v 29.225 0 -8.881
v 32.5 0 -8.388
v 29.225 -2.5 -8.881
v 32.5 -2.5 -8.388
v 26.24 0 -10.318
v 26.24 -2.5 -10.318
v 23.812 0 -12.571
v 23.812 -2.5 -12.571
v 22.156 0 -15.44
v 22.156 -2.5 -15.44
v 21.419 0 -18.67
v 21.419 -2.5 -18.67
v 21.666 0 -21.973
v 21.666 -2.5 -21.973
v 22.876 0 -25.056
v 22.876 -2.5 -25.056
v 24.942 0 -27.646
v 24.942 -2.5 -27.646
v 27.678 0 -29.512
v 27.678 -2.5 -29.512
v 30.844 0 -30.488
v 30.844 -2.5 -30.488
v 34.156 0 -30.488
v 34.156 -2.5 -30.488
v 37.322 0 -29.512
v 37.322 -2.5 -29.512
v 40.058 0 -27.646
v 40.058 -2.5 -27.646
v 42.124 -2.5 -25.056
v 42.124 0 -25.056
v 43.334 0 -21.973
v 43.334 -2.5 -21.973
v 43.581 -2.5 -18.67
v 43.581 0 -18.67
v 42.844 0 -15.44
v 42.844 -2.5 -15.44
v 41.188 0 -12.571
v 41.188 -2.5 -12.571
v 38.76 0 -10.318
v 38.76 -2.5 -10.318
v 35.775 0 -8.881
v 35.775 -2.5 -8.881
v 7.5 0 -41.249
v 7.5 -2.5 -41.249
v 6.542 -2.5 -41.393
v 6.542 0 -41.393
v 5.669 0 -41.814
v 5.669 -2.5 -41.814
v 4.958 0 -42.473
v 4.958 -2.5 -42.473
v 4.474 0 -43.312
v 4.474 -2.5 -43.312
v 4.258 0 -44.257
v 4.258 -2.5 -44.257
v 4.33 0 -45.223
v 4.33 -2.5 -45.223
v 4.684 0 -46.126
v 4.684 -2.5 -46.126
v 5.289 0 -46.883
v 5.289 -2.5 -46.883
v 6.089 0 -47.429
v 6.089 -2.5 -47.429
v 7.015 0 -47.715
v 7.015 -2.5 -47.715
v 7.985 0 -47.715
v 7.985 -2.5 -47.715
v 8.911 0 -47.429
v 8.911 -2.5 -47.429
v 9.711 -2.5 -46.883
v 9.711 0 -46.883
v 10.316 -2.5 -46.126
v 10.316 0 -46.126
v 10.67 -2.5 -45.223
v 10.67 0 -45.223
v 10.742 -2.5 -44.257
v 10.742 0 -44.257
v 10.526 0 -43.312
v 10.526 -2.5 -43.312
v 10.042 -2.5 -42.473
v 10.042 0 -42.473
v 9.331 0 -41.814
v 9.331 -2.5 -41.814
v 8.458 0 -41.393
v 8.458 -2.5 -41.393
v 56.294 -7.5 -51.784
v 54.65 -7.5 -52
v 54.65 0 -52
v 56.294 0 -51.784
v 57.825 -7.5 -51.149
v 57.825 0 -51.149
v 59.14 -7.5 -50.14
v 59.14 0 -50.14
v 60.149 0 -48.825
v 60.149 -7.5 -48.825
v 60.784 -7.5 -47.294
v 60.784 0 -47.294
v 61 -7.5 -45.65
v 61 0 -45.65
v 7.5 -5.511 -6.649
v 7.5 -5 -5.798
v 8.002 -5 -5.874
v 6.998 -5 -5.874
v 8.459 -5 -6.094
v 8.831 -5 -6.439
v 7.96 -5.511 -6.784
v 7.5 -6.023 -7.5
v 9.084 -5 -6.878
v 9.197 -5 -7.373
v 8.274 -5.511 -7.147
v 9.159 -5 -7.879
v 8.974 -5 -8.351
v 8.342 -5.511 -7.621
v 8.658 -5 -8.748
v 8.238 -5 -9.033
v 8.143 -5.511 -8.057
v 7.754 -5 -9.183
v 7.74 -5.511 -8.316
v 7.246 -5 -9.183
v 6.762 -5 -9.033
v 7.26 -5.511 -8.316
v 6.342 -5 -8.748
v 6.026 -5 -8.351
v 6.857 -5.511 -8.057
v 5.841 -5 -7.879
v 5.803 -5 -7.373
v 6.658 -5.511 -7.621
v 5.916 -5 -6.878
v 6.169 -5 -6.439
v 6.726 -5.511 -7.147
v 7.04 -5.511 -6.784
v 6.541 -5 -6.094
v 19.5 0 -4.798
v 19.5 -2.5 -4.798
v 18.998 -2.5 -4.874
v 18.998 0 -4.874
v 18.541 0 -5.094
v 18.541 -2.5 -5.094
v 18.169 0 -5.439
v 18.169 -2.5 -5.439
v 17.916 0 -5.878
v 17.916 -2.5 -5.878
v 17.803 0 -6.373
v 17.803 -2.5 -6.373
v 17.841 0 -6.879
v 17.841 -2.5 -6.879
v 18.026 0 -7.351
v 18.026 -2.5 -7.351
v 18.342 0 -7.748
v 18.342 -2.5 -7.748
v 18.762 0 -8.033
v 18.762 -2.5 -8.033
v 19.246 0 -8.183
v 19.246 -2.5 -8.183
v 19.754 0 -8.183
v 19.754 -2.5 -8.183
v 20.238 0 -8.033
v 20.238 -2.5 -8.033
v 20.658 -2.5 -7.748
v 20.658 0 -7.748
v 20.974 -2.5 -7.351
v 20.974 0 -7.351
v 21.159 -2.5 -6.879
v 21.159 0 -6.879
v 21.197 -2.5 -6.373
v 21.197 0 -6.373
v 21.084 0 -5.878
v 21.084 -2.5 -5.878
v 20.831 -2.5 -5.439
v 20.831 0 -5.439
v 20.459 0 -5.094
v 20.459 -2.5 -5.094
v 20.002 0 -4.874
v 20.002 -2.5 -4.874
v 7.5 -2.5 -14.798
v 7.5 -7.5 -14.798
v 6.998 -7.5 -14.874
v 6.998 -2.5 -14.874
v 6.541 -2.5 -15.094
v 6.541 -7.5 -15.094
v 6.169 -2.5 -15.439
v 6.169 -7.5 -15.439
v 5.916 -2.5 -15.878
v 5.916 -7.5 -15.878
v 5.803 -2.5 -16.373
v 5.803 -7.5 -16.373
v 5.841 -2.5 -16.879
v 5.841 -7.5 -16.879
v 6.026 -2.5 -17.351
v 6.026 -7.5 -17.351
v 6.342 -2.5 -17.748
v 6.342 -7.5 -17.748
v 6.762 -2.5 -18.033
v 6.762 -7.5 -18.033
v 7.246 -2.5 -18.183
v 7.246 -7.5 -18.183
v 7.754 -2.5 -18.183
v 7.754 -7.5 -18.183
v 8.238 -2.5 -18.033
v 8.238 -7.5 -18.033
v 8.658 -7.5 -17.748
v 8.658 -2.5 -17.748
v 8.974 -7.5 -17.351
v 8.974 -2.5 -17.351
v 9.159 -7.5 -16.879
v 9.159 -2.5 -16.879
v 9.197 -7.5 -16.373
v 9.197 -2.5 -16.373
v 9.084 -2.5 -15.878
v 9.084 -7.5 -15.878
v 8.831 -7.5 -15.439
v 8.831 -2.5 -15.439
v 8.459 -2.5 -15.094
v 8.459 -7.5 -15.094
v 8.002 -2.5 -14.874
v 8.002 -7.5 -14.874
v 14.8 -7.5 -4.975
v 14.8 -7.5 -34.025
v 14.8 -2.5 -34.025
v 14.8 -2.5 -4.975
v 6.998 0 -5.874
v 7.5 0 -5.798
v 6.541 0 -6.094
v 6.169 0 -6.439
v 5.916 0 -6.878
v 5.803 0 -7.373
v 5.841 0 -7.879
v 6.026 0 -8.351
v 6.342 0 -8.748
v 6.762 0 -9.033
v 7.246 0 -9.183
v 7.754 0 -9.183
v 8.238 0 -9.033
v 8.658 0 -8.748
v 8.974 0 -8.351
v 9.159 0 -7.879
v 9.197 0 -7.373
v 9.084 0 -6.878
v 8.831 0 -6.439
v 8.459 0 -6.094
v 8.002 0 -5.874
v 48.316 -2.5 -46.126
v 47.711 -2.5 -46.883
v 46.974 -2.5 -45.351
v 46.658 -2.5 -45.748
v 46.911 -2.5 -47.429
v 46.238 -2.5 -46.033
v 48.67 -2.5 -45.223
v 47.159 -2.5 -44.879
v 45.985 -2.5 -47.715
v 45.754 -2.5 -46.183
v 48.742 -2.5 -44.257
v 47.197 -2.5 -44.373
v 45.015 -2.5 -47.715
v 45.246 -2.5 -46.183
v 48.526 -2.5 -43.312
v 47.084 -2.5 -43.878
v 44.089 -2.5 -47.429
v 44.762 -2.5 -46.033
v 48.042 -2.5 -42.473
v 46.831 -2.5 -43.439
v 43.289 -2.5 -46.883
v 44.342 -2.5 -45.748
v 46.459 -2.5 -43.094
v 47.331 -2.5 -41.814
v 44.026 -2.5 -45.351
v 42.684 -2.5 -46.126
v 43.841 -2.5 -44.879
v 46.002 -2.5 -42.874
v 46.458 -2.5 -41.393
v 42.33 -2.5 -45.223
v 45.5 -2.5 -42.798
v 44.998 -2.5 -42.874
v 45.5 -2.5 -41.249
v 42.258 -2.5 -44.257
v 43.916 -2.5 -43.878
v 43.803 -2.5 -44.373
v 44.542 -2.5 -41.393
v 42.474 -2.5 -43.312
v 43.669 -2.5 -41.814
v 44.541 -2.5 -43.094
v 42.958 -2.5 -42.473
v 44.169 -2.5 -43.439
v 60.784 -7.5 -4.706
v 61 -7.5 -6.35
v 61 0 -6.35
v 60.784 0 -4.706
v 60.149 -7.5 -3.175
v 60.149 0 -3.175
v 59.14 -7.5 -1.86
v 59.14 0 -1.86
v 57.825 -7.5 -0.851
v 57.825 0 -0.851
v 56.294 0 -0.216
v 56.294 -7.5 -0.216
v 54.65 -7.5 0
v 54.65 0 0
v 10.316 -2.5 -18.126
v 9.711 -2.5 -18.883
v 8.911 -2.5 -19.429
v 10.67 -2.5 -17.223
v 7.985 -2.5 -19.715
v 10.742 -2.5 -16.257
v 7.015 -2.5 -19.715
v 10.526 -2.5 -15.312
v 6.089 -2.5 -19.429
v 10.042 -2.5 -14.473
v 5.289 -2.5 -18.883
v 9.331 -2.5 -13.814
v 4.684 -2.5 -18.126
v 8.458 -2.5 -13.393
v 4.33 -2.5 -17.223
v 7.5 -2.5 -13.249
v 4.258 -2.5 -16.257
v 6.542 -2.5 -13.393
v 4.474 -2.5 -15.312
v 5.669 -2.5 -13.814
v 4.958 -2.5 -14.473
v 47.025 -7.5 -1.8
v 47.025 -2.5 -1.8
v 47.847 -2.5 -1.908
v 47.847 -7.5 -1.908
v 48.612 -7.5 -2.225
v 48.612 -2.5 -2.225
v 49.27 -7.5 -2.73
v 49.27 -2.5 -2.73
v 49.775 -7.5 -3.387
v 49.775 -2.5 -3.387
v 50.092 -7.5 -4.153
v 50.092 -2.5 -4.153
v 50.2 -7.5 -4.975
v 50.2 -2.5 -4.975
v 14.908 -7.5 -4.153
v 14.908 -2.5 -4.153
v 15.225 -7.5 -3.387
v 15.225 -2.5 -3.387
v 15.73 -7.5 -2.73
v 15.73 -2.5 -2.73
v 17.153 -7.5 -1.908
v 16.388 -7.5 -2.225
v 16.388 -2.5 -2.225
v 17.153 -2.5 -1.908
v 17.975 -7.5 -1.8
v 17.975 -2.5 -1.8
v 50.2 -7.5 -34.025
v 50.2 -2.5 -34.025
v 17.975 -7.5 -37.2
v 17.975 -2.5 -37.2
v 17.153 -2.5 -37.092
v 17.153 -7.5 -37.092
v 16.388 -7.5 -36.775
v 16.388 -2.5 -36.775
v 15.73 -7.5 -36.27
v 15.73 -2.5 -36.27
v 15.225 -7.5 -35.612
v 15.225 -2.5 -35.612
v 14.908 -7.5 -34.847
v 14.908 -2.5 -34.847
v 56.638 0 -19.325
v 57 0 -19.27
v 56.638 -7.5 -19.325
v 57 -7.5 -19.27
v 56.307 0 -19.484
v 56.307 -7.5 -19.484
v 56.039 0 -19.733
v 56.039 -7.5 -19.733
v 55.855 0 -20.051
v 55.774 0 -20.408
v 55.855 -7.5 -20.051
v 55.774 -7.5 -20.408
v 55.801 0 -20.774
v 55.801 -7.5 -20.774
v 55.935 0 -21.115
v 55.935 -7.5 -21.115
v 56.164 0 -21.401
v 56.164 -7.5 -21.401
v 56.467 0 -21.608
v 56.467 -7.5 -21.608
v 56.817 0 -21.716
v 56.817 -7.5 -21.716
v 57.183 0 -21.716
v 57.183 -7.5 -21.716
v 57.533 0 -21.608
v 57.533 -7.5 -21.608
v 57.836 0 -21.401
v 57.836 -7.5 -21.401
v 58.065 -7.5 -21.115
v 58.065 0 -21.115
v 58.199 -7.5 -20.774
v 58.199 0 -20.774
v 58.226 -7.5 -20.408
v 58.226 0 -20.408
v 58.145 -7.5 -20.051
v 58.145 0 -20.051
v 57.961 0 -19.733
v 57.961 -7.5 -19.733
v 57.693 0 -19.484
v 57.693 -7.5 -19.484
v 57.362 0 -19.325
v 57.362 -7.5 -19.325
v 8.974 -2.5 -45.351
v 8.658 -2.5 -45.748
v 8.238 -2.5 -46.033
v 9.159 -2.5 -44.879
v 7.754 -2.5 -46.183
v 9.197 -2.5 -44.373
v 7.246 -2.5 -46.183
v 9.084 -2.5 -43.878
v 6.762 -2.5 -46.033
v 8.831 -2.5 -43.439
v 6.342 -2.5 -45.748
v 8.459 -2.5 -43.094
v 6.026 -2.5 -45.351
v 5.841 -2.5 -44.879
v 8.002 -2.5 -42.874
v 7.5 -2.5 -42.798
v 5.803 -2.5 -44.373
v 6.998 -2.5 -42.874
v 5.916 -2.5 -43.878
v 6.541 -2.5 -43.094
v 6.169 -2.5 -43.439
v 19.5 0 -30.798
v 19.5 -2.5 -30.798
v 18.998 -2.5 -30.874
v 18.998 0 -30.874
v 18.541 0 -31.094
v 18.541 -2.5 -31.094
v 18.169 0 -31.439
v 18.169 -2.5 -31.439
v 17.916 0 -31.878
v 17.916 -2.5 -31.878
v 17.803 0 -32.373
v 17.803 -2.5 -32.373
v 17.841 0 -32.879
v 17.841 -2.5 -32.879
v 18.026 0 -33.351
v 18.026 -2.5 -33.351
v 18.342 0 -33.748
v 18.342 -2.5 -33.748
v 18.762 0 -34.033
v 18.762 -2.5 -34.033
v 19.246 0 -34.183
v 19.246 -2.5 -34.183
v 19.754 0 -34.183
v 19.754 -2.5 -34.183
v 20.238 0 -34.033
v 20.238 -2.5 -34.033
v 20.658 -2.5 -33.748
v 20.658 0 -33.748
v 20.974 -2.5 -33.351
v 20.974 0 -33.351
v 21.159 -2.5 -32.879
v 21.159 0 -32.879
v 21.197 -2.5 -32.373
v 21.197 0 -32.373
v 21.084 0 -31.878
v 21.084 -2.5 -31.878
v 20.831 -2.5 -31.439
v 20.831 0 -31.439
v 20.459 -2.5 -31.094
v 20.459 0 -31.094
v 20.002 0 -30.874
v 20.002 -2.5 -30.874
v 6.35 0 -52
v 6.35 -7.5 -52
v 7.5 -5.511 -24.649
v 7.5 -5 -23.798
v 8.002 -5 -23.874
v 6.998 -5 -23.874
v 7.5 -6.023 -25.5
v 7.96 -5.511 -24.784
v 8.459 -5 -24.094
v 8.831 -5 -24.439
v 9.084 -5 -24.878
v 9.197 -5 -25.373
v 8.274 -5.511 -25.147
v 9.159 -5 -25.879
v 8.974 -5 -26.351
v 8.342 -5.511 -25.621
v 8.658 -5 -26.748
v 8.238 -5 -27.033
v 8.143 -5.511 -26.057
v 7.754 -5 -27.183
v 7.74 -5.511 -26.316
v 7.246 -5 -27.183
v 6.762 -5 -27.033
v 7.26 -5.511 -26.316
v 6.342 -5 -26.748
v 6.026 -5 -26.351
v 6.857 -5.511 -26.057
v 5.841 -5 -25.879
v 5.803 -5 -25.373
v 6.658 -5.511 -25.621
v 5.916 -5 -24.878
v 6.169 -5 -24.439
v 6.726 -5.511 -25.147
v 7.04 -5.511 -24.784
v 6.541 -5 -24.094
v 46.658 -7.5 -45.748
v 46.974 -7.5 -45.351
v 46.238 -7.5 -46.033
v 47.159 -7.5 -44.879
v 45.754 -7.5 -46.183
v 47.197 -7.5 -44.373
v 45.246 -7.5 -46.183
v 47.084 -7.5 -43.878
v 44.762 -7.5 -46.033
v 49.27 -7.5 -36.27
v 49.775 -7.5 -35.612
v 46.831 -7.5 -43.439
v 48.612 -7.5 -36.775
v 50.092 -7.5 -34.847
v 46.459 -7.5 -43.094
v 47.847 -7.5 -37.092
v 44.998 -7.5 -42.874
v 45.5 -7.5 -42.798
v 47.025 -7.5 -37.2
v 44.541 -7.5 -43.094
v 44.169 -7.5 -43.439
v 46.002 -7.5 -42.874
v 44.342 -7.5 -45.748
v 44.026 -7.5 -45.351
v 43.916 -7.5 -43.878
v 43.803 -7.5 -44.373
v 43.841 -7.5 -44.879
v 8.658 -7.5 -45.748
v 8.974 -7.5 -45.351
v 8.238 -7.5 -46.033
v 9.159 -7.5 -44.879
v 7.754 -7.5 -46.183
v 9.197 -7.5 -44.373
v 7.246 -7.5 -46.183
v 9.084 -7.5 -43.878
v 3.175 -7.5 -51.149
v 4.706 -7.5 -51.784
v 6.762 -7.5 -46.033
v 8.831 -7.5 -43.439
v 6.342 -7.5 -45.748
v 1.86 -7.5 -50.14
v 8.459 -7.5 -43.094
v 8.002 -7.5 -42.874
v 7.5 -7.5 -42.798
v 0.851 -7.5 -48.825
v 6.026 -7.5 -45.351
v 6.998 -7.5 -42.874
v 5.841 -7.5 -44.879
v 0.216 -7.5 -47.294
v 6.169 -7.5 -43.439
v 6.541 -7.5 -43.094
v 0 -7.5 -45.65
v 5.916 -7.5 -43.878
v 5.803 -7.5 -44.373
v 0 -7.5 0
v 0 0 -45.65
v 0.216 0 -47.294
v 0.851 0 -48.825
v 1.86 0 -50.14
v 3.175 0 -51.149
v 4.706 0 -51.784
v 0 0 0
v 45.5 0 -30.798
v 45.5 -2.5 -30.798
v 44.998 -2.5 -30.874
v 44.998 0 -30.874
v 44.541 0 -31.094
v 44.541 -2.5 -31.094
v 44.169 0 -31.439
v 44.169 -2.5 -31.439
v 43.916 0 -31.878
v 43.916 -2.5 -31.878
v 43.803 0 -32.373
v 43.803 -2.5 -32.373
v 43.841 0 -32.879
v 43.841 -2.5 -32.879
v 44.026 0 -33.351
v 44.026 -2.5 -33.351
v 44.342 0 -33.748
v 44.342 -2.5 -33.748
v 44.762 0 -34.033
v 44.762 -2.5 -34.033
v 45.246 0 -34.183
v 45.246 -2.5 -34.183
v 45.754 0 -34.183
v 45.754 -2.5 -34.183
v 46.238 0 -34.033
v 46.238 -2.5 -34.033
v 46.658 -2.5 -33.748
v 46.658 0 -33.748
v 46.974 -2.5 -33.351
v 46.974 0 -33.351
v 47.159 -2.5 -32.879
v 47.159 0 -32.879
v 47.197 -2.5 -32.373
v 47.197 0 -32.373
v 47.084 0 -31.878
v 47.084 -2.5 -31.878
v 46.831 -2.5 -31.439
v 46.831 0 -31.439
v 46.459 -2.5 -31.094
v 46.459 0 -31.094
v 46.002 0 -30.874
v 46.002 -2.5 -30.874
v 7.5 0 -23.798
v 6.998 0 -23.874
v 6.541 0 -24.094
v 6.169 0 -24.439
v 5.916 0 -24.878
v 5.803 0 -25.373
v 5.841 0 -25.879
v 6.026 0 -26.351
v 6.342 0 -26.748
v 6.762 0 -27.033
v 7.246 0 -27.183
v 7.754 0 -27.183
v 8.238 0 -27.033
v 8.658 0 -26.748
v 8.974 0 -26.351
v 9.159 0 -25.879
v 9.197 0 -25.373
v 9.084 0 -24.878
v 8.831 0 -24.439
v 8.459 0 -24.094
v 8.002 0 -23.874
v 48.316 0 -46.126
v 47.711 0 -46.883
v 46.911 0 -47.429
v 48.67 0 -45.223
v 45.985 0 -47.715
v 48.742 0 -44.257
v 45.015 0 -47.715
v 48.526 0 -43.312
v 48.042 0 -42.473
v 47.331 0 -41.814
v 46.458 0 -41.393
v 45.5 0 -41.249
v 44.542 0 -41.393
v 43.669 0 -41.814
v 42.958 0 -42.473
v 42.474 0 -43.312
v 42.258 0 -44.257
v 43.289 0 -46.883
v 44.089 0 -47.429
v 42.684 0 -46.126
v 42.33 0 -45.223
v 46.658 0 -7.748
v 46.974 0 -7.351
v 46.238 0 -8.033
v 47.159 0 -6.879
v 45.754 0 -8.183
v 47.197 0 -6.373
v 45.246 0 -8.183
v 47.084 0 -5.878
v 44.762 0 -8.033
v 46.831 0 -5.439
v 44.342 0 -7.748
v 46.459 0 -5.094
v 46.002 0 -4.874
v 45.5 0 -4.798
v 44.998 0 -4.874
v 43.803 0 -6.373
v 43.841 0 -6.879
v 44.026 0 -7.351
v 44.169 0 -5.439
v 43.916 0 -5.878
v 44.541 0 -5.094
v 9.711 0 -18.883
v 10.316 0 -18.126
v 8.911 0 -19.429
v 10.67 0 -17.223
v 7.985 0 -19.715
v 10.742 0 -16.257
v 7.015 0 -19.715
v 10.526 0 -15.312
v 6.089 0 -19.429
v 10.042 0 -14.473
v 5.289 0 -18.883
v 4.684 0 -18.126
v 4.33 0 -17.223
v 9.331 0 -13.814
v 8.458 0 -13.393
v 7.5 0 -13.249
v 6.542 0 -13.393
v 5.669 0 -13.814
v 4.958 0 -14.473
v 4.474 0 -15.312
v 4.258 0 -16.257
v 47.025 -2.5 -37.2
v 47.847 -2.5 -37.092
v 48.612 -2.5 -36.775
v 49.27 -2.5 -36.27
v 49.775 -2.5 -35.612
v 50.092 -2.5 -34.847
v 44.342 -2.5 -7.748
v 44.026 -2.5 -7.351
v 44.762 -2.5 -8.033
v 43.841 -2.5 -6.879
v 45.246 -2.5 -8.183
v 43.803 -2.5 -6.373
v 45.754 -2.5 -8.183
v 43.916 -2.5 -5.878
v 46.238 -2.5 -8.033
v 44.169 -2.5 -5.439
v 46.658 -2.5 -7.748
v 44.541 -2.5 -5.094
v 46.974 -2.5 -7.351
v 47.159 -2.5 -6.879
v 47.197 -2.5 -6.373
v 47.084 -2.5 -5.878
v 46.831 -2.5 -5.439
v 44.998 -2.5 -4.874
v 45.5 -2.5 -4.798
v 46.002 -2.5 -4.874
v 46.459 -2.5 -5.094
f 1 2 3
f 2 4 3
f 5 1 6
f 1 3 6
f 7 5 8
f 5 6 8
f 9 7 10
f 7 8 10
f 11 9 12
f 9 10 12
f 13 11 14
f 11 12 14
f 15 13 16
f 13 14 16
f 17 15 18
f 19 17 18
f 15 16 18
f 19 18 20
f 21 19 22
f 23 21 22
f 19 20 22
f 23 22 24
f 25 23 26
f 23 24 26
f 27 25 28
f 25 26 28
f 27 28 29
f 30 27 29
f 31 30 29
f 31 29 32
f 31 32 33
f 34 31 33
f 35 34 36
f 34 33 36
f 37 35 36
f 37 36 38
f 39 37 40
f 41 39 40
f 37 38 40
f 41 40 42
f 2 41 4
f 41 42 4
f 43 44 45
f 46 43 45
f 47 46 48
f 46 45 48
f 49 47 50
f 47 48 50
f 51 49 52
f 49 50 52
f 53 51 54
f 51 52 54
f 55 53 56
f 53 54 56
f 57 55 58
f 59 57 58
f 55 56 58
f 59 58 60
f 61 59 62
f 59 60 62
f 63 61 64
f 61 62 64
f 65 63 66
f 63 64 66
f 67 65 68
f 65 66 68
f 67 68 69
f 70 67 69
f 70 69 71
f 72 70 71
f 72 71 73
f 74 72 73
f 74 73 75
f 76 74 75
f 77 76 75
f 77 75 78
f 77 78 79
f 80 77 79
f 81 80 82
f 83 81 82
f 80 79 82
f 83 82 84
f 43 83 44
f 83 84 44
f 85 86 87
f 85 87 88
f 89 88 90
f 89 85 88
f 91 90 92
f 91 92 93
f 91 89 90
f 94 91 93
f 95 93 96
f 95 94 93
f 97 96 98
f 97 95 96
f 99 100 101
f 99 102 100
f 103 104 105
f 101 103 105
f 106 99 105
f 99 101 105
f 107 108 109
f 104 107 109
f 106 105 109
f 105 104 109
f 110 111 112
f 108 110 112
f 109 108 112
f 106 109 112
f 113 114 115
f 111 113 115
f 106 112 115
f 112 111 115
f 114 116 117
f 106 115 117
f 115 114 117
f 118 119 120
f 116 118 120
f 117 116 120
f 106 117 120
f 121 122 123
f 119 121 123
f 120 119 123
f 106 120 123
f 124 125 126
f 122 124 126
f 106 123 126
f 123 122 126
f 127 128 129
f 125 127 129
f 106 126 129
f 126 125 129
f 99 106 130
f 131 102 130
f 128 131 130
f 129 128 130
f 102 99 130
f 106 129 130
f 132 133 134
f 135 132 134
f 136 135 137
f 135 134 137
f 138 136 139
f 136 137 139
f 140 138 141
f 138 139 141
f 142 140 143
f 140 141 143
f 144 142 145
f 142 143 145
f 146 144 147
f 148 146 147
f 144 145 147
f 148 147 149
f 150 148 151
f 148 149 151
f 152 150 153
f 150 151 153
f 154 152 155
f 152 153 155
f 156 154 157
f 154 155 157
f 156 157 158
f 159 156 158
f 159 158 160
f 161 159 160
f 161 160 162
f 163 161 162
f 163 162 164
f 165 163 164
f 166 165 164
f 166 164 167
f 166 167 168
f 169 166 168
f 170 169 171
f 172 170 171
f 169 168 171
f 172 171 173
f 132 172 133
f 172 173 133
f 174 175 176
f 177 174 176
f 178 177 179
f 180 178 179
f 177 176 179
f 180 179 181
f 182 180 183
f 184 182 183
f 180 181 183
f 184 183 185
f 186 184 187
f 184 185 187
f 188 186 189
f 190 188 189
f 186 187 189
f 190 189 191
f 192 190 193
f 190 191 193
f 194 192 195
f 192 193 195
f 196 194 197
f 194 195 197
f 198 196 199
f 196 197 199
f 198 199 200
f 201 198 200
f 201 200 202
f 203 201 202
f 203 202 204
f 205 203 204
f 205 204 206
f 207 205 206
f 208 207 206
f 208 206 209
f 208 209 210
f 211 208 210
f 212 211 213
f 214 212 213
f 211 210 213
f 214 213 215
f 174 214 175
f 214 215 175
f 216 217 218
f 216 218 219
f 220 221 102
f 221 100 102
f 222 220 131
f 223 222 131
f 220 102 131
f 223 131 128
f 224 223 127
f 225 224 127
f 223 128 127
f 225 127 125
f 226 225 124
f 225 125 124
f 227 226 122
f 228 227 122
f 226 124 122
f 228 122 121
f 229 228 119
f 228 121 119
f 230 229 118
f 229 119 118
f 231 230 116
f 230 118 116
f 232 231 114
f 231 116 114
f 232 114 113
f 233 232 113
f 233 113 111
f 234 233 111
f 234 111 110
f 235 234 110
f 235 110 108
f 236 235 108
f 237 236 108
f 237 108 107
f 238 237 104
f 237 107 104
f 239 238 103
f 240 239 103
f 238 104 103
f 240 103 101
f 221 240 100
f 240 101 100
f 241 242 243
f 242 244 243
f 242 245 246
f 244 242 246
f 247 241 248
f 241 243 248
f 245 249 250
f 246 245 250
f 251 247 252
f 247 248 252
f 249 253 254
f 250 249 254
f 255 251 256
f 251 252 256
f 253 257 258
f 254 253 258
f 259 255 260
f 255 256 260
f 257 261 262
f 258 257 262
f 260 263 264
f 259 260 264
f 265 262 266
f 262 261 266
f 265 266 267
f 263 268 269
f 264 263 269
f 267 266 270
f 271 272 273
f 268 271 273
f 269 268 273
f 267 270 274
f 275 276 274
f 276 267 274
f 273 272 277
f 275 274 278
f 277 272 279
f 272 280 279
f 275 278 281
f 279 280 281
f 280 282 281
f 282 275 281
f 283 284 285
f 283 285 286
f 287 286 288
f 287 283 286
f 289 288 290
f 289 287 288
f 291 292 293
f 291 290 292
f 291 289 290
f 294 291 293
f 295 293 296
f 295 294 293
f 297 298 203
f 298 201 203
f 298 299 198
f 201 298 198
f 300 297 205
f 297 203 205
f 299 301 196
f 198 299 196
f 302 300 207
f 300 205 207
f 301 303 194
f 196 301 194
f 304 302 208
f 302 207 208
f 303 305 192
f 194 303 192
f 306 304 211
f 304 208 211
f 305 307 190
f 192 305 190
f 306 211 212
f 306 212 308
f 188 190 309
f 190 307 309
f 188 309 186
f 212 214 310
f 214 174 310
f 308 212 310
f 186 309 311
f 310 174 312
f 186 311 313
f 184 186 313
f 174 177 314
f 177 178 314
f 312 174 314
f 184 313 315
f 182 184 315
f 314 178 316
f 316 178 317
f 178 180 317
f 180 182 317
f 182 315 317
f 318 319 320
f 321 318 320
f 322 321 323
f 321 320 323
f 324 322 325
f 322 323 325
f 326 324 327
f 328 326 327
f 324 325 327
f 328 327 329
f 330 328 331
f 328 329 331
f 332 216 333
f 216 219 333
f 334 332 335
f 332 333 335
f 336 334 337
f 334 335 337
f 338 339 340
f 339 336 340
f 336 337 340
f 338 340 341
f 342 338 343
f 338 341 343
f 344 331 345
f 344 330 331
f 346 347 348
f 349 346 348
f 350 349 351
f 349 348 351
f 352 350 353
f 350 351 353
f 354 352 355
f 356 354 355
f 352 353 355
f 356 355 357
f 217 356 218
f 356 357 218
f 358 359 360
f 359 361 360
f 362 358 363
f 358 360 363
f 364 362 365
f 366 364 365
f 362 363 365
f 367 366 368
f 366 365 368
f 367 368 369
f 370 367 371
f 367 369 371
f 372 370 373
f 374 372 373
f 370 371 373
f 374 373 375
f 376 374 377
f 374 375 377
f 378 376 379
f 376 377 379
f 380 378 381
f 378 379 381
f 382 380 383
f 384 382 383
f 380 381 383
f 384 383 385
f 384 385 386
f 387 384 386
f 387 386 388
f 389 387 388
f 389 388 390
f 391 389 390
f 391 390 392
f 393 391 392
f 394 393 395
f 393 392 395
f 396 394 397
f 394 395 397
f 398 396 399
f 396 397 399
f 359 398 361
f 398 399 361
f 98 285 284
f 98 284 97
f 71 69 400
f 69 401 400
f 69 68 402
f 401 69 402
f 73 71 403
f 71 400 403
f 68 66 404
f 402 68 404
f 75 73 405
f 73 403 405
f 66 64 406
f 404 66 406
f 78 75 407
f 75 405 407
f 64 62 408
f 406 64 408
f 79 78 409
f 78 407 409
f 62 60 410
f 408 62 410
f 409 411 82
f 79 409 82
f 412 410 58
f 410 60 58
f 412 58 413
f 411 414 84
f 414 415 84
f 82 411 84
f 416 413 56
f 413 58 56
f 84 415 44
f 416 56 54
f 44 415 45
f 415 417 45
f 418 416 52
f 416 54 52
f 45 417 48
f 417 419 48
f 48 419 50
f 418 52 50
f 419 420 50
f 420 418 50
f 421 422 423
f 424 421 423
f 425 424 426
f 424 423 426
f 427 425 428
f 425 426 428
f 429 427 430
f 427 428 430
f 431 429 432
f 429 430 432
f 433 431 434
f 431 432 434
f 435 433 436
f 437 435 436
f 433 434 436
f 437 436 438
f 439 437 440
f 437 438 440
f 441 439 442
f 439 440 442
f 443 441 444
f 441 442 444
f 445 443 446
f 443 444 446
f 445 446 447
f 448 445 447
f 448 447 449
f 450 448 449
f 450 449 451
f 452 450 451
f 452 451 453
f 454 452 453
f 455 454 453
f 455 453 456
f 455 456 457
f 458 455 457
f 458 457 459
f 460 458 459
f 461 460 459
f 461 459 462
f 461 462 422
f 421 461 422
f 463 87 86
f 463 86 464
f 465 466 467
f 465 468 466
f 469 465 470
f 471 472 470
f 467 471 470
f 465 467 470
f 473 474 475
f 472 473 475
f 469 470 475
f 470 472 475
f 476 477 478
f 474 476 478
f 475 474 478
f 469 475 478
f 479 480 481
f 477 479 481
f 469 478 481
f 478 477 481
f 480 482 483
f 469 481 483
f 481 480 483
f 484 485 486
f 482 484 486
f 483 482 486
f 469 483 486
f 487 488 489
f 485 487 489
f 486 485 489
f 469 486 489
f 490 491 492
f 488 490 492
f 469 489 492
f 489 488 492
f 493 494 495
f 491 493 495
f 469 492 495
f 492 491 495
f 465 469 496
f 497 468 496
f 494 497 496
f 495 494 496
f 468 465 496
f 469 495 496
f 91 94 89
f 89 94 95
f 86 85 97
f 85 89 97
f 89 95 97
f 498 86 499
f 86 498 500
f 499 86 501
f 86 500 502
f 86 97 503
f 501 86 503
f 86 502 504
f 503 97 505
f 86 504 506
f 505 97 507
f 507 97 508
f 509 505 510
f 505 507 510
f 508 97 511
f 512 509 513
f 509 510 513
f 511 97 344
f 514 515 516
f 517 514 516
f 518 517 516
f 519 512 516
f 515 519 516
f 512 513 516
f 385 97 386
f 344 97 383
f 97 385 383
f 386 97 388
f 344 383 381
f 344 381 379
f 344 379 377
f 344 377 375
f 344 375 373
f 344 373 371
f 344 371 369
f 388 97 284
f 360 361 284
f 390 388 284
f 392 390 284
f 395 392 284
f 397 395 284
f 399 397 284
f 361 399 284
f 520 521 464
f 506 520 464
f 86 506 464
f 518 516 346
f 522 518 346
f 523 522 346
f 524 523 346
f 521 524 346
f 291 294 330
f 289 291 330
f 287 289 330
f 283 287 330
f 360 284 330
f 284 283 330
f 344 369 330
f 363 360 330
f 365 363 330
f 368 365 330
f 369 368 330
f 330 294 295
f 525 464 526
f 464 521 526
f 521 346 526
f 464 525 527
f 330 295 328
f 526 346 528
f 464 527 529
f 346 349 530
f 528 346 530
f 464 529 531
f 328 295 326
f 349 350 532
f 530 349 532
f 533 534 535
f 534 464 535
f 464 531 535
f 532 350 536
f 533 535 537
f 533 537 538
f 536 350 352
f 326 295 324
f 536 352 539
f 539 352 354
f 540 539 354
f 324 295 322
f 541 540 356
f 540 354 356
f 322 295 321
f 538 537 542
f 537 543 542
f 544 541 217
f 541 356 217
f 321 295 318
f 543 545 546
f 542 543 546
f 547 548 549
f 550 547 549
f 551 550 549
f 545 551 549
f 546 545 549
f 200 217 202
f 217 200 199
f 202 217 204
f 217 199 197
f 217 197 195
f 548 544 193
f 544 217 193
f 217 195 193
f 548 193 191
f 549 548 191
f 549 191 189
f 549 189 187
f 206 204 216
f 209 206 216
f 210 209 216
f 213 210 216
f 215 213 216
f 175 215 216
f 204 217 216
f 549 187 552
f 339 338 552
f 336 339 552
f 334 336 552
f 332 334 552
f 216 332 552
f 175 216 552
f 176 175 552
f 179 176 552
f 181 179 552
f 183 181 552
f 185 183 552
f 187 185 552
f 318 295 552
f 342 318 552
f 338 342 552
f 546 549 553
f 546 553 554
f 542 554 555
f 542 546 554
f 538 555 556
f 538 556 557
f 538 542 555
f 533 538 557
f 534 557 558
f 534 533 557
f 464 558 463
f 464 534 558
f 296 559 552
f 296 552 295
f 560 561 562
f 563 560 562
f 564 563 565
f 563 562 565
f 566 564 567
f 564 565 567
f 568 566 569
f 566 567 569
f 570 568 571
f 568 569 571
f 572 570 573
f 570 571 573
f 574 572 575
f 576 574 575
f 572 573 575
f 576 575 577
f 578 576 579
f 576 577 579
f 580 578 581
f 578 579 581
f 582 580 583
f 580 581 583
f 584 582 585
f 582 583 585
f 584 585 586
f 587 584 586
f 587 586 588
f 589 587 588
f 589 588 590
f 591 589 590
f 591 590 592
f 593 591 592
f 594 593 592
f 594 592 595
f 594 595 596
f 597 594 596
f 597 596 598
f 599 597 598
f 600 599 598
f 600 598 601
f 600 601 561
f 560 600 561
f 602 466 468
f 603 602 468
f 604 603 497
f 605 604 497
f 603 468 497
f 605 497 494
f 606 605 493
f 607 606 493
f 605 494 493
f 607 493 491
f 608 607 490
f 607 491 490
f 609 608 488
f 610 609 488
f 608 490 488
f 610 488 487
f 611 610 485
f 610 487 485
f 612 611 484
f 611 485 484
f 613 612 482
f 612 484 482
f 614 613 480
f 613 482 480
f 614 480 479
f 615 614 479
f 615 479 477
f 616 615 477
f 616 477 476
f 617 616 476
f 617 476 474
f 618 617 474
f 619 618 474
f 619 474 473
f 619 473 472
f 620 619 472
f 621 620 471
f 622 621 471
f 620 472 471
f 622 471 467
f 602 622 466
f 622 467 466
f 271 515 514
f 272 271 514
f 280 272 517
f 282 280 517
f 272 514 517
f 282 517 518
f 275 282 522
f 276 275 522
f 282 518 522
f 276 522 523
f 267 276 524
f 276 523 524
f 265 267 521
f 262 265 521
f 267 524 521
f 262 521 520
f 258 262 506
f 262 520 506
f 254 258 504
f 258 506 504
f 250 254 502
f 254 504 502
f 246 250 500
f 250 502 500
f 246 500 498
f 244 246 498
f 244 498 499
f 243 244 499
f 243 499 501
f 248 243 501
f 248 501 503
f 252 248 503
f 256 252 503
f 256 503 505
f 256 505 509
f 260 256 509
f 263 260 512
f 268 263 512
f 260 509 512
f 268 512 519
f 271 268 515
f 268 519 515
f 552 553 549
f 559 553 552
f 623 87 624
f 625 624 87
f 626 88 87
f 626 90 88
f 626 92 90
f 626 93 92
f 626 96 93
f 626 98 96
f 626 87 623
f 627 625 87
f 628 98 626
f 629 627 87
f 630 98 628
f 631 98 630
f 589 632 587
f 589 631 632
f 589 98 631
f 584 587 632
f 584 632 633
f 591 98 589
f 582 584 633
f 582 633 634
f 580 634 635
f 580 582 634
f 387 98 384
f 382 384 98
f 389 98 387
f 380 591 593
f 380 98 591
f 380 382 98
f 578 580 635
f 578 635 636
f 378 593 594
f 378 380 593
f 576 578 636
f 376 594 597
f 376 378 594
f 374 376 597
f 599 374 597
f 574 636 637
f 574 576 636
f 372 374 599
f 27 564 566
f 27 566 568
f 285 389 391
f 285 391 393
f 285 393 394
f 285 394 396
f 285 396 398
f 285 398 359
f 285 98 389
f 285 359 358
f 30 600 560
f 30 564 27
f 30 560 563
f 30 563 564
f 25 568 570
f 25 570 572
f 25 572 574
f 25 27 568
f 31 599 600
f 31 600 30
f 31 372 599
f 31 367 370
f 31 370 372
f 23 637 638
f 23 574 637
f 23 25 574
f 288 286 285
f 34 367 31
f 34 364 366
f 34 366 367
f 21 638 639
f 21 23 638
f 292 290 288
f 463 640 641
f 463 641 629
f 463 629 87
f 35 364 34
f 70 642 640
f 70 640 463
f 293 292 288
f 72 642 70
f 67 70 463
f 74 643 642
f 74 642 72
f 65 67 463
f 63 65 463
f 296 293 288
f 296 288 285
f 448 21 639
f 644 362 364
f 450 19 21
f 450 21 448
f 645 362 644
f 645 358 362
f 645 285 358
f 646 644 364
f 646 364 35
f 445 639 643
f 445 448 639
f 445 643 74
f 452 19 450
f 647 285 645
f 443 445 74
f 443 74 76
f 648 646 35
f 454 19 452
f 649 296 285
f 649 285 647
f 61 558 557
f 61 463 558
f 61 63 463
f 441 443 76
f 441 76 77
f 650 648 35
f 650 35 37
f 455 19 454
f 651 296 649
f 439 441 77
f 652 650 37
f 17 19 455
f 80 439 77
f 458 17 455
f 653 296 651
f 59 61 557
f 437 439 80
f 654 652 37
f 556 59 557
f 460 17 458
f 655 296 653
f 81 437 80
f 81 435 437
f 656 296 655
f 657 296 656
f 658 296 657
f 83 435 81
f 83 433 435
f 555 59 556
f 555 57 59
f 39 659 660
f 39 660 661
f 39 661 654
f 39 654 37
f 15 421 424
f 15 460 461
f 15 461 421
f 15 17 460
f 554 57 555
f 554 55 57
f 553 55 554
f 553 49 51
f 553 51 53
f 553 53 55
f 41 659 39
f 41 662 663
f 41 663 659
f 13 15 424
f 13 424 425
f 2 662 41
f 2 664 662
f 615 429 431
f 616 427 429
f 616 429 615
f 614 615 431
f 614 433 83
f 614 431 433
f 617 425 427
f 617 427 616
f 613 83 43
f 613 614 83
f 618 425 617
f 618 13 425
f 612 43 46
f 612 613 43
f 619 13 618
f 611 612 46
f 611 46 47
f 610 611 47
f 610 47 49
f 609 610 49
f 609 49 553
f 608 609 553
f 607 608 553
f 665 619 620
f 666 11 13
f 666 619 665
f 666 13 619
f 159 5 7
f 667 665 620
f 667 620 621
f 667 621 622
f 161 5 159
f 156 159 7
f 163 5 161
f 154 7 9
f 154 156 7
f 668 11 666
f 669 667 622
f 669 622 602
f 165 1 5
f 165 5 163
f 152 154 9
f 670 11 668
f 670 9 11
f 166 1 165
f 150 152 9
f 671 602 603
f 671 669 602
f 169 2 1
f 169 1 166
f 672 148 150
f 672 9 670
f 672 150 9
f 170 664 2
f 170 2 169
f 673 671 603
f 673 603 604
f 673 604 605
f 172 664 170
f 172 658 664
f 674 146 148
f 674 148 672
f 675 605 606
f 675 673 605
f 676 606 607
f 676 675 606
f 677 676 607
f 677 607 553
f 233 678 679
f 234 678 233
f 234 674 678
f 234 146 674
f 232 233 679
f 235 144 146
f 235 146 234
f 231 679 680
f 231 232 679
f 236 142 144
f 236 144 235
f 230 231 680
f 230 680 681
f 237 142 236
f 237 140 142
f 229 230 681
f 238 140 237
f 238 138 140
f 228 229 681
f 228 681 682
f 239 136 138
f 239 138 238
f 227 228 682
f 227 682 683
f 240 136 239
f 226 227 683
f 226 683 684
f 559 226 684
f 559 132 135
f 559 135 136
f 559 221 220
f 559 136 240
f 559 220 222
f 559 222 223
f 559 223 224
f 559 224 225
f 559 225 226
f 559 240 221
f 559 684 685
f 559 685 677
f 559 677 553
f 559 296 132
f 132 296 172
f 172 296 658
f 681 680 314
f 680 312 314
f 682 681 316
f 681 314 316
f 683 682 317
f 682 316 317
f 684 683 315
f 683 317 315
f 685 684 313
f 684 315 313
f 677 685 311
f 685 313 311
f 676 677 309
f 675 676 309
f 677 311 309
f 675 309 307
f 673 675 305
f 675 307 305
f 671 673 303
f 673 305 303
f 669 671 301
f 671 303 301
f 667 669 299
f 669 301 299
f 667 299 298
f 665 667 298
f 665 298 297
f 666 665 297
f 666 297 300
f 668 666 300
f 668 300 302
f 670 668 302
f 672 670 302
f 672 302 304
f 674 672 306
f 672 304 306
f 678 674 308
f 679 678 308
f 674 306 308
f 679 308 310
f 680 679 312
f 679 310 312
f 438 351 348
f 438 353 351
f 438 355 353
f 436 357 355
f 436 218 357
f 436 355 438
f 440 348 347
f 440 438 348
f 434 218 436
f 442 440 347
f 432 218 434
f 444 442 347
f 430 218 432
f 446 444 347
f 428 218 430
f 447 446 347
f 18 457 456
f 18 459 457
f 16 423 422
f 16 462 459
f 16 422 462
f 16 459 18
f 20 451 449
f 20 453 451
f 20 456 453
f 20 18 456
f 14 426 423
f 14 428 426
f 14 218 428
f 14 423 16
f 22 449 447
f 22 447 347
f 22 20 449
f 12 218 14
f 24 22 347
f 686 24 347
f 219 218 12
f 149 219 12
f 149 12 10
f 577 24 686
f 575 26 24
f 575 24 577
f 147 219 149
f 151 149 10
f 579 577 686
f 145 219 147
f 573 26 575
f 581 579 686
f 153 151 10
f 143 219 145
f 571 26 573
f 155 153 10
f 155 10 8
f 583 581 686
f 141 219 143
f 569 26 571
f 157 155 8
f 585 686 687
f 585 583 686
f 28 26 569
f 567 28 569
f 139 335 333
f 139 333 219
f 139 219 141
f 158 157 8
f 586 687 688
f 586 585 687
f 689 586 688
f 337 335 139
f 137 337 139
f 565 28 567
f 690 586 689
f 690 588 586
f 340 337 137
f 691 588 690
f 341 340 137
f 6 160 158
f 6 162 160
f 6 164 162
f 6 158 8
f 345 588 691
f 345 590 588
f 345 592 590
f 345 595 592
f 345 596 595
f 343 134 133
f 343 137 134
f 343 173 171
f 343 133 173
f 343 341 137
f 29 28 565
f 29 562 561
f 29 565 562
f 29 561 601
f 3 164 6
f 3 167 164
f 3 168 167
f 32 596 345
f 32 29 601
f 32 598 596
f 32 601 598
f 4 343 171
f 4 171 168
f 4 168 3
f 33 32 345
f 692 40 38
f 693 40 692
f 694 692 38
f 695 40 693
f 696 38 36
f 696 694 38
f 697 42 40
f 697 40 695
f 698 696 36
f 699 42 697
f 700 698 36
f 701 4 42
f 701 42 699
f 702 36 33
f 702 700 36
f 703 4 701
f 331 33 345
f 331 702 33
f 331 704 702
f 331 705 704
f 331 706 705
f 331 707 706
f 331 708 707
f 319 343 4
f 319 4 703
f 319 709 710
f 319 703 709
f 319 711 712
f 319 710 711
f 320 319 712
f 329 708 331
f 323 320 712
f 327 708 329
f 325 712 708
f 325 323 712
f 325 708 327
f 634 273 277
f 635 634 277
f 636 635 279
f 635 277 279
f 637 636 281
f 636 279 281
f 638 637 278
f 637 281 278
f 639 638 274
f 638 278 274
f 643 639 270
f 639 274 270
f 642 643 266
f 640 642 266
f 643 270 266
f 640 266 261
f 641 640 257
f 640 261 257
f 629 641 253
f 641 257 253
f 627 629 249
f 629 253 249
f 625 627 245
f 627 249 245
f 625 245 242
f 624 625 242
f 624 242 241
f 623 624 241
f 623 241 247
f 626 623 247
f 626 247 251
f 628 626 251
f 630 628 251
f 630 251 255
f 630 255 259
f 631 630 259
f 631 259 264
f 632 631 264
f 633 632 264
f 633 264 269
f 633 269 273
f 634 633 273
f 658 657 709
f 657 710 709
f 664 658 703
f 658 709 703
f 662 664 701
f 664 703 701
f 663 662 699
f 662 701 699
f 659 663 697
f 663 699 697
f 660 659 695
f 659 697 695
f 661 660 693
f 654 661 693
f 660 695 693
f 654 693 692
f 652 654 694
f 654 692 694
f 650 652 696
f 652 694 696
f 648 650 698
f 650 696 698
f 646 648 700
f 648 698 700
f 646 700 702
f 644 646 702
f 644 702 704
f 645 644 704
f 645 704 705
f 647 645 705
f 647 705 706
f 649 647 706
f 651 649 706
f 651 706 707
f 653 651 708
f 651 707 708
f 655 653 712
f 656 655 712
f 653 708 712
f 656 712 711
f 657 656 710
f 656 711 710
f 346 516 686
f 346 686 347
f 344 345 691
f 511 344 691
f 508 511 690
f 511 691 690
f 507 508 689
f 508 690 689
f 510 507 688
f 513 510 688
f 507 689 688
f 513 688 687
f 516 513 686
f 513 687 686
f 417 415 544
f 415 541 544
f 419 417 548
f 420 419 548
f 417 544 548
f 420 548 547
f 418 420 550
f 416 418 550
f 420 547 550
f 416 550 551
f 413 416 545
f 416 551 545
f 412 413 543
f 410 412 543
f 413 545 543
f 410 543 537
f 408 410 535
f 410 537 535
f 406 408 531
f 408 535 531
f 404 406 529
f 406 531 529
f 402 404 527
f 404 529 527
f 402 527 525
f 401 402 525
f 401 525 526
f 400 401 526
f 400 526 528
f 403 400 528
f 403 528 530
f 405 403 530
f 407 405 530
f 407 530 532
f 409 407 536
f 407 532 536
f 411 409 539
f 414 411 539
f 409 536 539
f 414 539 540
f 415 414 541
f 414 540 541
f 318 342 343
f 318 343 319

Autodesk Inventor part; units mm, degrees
ref_plane "YZ Plane" through (0, 0, 0) normal (1, 0, 0) x (0, 1, 0)
ref_plane "XZ Plane" through (0, 0, 0) normal (0, 1, 0) x (-1, 0, 0)
ref_plane "XY Plane" through (0, 0, 0) normal (0, 0, 1) x (1, 0, 0)
sketch "Main Sketch" plane through (0, 0, 0) normal (0, 1, 0) x (-1, 0, 0)
  line L0 (0, 0) -> (-61, 0)
  line L1 (-61, 0) -> (-61, -52)
  line L2 (-61, -52) -> (0, -52)
  line L3 (0, -52) -> (0, 0)
  circle A0 centre (-7.5, -7.5) radius 1.5
  circle A1 centre (-7.5, -16.5) radius 1.5
  circle A2 centre (-7.5, -25.5) radius 1.5
  circle A3 centre (-19.5, -6.5) radius 1.5
  circle A4 centre (-45.5, -6.5) radius 1.5
  circle A5 centre (-19.5, -32.5) radius 1.5
  circle A6 centre (-45.5, -32.5) radius 1.5
  circle A7 centre (-7.5, -44.5) radius 1.5
  circle A8 centre (-45.5, -44.5) radius 1.5
  circle A9 centre (-57, -20.5) radius 1.5
  circle A10 centre (-32.5, -19.5) radius 11.1125
  dimension "d126" = 61
  dimension "d127" = 52
  dimension "d128" = 3
  dimension "d129" = 7.5
  dimension "d130" = 25.5
  dimension "d131" = 16.5
  dimension "d132" = 7.5
  dimension "d133" = 3
  dimension "d134" = 6.5
  dimension "d135" = 19.5
  dimension "d137" = 45.5
  dimension "d138" = 32.5
  dimension "d139" = 44.5
  dimension "d159" = 57
  dimension "d160" = 20.5
  dimension "d175" = 22.225
  dimension "d176" = 32.5
  dimension "d177" = 19.5
extrude "Extrusion10" add sketch "Main Sketch" against normal blind 7.5 contours L3 L2 L1 L0 | A0 | A1 | A2 | A3 | A4 | A5 | A6 | A7 | A8 | A9 | A10
hole "Hole14" at (19.5, 0, -32.5) at (45.5, 0, -32.5) at (45.5, 0, -6.5) at (19.5, 0, -6.5) direction (0, -1, 0) diameter 3.4036 end through all clearance for "Socket Head Cap Screw" size "M3" standard "Ansi Metric M Profile"
hole "Frame Mounting Holes" at (7.5, 0, -16.5) at (7.5, 0, -44.5) at (45.5, 0, -44.5) direction (0, -1, 0) diameter 3.4036 end through all counterbore diameter 6.5024 counterbore depth 2.5 clearance for "Socket Head Cap Screw" size "M3" standard "Ansi Metric M Profile"
hole "Hole16" at (57, 0, -20.5) direction (0, -1, 0) diameter 2.459 end through all thread size "M3x0.5" class "6H" standard "ANSI Metric M Profile"
hole "Pin Mounting Holes" at (7.5, 0, -25.5) at (7.5, 0, -7.5) direction (0, -1, 0) diameter 3.4036 depth 5 tip angle 118 clearance for "Socket Head Cap Screw" size "M3" standard "Ansi Metric M Profile"
hole "Hole18" at (32.5, 0, -19.5) direction (0, -1, 0) diameter 22.225 end through all
sketch "Sketch15" plane through (0, -7.5, 0) normal (0, -1, 0) x (1, 0, 0)
  circle A0 centre (32.5, -19.5) radius 11.1125 projected
  circle A1 centre (57, -20.5) radius 1.2295 projected
  circle A2 centre (7.5, -16.5) radius 1.7018 projected
  circle A3 centre (19.5, -6.5) radius 1.7018 projected
  circle A4 centre (45.5, -6.5) radius 1.7018 projected
  circle A5 centre (45.5, -32.5) radius 1.7018 projected
  circle A6 centre (19.5, -32.5) radius 1.7018 projected
  line L0 (61, -52) -> (61, 0) projected
  line L1 (61, 0) -> (0, 0) projected
  line L2 (0, 0) -> (0, -52) projected
  line L3 (0, -52) -> (61, -52) projected
  line L4 (14.8, -1.8) -> (50.2, -1.8)
  line L5 (50.2, -1.8) -> (50.2, -37.2)
  line L6 (50.2, -37.2) -> (14.8, -37.2)
  line L7 (14.8, -37.2) -> (14.8, -1.8)
  dimension "d185" = 14.8
  dimension "d186" = 1.8
  dimension "d187" = 35.4
  dimension "d188" = 35.4
extrude "Extrusion11" cut sketch "Sketch15" against normal blind 5 contours L4 L5 L6 L7
fillet "Fillet1" radius 3.175 4 edges at (14.8, -5, -1.8) (50.2, -5, -1.8) (50.2, -5, -37.2) (14.8, -5, -37.2)
fillet "Fillet2" radius 6.35 3 edges at (61, -3.75, 0) (61, -3.75, -52) (0, -3.75, -52)
equation "\"d131\" = 0.5 * d130 + 0.5 * d129"
properties part number "A Drive Frame Lower" material "Aluminum 6061"
